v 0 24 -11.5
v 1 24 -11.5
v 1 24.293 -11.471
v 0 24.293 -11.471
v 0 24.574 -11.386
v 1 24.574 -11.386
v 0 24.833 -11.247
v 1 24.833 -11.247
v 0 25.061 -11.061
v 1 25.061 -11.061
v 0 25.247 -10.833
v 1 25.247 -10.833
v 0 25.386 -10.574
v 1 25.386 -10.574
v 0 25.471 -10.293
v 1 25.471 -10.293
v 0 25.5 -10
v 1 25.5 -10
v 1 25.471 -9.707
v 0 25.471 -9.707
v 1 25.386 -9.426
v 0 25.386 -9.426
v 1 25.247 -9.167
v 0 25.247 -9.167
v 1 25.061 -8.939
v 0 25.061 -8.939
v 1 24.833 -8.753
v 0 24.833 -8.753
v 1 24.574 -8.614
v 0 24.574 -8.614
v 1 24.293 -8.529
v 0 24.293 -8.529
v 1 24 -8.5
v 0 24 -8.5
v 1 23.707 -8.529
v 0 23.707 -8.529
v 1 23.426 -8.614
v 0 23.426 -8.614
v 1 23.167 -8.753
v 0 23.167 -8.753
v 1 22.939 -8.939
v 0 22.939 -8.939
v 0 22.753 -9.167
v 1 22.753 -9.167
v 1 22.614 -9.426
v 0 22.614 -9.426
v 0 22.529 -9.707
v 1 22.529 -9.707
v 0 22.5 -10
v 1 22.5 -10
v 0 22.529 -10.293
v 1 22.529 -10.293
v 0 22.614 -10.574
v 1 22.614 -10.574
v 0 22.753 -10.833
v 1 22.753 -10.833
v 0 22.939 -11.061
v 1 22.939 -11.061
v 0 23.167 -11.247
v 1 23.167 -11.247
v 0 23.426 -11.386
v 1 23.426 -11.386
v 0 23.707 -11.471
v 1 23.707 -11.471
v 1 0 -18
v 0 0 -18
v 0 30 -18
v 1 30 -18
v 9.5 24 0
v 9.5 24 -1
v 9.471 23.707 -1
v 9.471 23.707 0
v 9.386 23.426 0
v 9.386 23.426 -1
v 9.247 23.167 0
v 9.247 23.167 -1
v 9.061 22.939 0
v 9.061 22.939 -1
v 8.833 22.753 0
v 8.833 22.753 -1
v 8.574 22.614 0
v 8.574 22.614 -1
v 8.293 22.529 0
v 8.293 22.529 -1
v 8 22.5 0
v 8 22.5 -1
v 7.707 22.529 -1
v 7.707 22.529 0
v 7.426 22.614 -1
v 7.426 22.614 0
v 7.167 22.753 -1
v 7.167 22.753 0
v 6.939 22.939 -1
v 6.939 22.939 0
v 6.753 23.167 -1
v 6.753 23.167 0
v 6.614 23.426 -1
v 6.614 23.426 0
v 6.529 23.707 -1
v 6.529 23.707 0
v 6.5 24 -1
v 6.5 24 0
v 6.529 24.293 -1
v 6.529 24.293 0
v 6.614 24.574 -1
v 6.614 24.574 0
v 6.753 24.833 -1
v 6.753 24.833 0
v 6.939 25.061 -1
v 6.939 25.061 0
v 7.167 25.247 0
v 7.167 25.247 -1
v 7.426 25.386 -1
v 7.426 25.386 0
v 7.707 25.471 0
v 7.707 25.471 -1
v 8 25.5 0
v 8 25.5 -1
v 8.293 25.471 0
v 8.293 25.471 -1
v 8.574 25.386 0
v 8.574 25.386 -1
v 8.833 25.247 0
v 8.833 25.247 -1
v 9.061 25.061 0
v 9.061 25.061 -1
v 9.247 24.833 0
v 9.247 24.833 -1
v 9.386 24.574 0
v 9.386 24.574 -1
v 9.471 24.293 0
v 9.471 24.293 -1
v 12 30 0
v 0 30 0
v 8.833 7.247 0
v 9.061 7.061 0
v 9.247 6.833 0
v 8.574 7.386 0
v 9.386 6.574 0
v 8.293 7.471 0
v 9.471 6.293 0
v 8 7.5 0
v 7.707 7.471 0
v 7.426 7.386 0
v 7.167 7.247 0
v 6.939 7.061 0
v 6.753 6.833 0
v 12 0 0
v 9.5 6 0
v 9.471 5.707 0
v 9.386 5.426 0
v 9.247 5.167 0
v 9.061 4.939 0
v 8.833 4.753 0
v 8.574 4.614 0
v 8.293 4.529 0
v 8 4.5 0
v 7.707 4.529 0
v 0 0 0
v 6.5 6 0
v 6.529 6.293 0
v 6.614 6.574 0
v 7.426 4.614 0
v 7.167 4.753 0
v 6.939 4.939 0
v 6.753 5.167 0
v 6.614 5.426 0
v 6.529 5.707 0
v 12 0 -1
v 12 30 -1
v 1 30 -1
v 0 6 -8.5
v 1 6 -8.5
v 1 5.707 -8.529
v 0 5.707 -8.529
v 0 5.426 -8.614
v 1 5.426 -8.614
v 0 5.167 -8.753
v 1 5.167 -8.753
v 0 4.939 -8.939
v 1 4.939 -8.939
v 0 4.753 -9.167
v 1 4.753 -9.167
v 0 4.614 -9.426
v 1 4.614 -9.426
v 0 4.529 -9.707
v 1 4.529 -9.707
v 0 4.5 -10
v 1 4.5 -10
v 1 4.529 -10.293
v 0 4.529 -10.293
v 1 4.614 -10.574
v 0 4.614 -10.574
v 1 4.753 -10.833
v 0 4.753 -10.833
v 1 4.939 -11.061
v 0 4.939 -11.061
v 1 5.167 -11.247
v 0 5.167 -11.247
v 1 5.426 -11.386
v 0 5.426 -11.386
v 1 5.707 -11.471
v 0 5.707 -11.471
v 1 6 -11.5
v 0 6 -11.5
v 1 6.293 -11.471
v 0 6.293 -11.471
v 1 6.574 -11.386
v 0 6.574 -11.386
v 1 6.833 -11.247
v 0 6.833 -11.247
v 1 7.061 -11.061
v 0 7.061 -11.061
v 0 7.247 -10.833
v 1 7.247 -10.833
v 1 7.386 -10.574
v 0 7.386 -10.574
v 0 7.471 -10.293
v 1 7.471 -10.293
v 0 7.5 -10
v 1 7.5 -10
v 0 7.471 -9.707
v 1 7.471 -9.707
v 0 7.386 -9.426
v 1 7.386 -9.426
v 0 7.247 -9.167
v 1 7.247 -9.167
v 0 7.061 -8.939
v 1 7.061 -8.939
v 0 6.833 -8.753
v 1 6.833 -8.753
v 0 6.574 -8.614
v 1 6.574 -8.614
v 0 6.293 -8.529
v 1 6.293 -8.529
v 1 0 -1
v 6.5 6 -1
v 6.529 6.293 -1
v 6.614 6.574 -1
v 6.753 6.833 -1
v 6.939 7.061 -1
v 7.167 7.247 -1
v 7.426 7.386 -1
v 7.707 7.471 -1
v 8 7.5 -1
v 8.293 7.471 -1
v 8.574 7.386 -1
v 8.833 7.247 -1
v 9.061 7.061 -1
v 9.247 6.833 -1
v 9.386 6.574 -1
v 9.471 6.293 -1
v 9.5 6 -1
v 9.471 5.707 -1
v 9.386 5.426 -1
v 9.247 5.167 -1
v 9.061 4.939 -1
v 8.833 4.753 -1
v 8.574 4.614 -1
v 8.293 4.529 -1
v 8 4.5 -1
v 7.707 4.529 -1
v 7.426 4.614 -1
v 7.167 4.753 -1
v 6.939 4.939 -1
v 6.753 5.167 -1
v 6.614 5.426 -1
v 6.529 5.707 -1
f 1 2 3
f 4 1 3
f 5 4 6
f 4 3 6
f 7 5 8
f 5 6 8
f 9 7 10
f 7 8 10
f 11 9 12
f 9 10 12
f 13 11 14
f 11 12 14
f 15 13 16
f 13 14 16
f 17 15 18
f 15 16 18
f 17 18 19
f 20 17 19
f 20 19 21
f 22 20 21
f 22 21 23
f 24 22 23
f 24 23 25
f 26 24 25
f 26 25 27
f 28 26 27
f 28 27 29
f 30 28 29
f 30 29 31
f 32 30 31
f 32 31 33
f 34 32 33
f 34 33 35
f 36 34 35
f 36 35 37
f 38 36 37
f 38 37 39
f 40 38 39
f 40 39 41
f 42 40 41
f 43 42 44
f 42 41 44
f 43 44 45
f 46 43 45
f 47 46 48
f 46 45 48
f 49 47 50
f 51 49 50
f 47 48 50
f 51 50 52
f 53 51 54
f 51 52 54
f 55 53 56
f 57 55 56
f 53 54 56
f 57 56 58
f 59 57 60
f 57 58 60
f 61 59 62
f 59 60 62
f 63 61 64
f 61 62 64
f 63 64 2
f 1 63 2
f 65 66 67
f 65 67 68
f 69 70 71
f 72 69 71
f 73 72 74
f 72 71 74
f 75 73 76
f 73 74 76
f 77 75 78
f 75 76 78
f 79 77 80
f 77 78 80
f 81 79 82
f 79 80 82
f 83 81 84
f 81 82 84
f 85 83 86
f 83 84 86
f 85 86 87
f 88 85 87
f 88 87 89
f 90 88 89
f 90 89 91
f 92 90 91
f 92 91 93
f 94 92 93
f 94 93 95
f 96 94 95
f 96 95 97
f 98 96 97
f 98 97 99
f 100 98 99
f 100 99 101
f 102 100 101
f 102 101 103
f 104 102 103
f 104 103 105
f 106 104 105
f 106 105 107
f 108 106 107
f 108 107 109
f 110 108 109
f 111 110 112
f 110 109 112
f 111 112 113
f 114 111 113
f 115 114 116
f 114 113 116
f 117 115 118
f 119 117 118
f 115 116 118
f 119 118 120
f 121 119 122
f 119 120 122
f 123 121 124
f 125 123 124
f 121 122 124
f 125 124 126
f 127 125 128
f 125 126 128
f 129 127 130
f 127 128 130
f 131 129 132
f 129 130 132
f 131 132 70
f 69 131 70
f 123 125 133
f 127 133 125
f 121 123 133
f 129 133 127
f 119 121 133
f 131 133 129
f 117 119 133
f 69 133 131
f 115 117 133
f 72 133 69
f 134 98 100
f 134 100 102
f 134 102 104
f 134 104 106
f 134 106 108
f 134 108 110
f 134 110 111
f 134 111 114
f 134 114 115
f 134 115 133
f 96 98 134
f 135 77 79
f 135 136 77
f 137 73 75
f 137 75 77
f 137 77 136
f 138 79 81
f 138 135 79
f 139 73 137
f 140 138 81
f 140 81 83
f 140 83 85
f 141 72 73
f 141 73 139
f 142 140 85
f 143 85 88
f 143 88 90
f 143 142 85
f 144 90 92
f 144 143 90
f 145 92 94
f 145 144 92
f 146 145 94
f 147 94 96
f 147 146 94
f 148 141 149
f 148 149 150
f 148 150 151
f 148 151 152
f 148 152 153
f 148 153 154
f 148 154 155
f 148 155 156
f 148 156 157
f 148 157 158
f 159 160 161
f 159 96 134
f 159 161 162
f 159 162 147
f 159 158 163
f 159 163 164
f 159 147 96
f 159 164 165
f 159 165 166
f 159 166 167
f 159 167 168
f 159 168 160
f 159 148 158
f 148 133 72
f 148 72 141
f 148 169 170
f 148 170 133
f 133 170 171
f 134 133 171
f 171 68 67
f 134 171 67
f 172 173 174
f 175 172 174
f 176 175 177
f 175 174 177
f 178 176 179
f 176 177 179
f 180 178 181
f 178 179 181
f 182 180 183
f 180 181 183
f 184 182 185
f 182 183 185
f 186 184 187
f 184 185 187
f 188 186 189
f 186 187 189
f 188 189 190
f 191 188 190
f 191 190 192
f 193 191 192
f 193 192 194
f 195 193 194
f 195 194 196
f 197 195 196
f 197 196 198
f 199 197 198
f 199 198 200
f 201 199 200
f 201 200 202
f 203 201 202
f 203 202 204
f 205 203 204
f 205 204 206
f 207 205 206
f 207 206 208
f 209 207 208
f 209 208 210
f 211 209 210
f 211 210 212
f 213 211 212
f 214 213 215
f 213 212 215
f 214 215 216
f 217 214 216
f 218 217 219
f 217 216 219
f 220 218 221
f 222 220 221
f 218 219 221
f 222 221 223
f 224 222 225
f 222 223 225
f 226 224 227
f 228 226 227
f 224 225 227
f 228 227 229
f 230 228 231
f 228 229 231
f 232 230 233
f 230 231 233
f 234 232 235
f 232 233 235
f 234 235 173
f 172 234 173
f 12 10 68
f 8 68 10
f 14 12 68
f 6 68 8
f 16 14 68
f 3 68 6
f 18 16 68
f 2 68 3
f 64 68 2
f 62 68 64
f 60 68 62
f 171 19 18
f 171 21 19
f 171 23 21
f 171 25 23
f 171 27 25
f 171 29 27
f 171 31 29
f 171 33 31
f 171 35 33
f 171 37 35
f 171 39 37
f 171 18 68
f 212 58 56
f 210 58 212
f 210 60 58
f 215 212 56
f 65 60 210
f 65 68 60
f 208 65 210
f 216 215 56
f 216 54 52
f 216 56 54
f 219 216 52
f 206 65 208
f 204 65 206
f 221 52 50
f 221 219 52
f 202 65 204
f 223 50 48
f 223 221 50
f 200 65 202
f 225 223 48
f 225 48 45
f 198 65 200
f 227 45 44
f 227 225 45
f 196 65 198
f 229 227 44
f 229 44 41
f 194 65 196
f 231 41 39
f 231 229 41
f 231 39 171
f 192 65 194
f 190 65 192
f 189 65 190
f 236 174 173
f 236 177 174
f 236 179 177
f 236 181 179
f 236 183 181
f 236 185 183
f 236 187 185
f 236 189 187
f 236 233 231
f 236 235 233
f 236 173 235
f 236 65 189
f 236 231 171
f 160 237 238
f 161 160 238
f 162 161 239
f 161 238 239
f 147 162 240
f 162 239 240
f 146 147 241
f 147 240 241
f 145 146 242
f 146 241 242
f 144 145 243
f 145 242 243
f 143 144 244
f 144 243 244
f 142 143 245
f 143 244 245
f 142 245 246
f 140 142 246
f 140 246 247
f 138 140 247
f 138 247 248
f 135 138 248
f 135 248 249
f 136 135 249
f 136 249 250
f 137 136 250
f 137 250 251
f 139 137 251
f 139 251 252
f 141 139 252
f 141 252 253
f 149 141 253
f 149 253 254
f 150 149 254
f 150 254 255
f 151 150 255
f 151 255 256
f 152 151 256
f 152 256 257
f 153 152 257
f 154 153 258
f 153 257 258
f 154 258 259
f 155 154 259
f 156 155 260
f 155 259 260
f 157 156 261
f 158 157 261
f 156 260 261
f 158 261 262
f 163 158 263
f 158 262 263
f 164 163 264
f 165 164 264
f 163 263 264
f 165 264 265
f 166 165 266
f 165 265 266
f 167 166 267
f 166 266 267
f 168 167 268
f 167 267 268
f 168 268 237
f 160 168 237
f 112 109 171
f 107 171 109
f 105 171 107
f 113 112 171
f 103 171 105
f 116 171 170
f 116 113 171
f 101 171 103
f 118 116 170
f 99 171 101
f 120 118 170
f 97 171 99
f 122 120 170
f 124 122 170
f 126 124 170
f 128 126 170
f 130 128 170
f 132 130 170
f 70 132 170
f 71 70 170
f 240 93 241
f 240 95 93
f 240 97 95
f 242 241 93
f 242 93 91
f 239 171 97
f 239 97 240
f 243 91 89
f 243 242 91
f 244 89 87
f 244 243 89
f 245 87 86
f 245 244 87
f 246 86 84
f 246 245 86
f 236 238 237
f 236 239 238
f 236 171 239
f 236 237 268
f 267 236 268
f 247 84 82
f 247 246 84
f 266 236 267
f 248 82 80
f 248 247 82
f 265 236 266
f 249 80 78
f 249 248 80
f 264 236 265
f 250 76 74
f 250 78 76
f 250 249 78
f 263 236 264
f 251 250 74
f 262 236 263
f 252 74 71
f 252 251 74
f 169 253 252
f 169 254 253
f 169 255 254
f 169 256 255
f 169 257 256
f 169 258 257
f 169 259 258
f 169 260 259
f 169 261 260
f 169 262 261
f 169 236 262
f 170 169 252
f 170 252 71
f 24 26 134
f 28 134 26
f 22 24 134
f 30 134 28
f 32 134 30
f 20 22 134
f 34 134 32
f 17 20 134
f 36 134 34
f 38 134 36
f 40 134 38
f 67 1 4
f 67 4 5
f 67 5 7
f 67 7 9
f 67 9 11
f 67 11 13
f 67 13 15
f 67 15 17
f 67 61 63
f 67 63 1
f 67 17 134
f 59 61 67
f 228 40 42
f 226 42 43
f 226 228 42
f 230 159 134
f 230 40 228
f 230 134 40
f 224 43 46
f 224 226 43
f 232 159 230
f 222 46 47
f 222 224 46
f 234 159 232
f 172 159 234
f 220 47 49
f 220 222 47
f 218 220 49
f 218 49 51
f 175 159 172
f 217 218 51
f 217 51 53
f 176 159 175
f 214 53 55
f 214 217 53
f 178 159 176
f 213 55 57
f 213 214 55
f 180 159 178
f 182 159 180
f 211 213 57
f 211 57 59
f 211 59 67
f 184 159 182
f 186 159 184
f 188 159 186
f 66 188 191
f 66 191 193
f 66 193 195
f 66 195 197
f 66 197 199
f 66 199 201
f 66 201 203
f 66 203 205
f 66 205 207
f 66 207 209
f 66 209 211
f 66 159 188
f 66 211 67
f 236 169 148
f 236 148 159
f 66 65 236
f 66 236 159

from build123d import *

# Parameters (mm, degrees)
EXTRUDE_2_DEPTH     = 30
SKETCH_5_R          = 1.5
CUT_EXTRUDE_3_DEPTH = 37.510272527
SKETCH_6_R          = 1.5
CUT_EXTRUDE_4_DEPTH = 37.674241642


with BuildPart() as part:
    # 草图4 → 凸台-拉伸2 (new body)
    with BuildSketch(Plane(origin=(0, 0, 0), x_dir=(1, 0, 0), z_dir=(0, 1, 0))):
        Polygon((0, 0), (0, 18), (1, 18), (1, 1), (12, 1), (12, 0), align=None)
    extrude(amount=EXTRUDE_2_DEPTH)

    # 草图5 → 切除-拉伸3 (cut, through all)
    with BuildSketch(Plane(origin=(0, 0, -1), x_dir=(-1, 0, 0), z_dir=(0, 0, -1))):
        with Locations((-8, 6)):
            Circle(SKETCH_5_R)
        with Locations(Location((-8, 24, 0), (0, 0, 180))):
            Circle(SKETCH_5_R)
    extrude(amount=-CUT_EXTRUDE_3_DEPTH, mode=Mode.SUBTRACT)

    # 草图6 → 切除-拉伸4 (cut, through all)
    with BuildSketch(Plane(origin=(1, 0, 0), x_dir=(0, 0, -1), z_dir=(1, 0, 0))):
        with Locations((10, 24)):
            Circle(SKETCH_6_R)
        with Locations(Location((10, 6, 0), (0, 0, 180))):
            Circle(SKETCH_6_R)
    extrude(amount=-CUT_EXTRUDE_4_DEPTH, mode=Mode.SUBTRACT)


solid = part.part
